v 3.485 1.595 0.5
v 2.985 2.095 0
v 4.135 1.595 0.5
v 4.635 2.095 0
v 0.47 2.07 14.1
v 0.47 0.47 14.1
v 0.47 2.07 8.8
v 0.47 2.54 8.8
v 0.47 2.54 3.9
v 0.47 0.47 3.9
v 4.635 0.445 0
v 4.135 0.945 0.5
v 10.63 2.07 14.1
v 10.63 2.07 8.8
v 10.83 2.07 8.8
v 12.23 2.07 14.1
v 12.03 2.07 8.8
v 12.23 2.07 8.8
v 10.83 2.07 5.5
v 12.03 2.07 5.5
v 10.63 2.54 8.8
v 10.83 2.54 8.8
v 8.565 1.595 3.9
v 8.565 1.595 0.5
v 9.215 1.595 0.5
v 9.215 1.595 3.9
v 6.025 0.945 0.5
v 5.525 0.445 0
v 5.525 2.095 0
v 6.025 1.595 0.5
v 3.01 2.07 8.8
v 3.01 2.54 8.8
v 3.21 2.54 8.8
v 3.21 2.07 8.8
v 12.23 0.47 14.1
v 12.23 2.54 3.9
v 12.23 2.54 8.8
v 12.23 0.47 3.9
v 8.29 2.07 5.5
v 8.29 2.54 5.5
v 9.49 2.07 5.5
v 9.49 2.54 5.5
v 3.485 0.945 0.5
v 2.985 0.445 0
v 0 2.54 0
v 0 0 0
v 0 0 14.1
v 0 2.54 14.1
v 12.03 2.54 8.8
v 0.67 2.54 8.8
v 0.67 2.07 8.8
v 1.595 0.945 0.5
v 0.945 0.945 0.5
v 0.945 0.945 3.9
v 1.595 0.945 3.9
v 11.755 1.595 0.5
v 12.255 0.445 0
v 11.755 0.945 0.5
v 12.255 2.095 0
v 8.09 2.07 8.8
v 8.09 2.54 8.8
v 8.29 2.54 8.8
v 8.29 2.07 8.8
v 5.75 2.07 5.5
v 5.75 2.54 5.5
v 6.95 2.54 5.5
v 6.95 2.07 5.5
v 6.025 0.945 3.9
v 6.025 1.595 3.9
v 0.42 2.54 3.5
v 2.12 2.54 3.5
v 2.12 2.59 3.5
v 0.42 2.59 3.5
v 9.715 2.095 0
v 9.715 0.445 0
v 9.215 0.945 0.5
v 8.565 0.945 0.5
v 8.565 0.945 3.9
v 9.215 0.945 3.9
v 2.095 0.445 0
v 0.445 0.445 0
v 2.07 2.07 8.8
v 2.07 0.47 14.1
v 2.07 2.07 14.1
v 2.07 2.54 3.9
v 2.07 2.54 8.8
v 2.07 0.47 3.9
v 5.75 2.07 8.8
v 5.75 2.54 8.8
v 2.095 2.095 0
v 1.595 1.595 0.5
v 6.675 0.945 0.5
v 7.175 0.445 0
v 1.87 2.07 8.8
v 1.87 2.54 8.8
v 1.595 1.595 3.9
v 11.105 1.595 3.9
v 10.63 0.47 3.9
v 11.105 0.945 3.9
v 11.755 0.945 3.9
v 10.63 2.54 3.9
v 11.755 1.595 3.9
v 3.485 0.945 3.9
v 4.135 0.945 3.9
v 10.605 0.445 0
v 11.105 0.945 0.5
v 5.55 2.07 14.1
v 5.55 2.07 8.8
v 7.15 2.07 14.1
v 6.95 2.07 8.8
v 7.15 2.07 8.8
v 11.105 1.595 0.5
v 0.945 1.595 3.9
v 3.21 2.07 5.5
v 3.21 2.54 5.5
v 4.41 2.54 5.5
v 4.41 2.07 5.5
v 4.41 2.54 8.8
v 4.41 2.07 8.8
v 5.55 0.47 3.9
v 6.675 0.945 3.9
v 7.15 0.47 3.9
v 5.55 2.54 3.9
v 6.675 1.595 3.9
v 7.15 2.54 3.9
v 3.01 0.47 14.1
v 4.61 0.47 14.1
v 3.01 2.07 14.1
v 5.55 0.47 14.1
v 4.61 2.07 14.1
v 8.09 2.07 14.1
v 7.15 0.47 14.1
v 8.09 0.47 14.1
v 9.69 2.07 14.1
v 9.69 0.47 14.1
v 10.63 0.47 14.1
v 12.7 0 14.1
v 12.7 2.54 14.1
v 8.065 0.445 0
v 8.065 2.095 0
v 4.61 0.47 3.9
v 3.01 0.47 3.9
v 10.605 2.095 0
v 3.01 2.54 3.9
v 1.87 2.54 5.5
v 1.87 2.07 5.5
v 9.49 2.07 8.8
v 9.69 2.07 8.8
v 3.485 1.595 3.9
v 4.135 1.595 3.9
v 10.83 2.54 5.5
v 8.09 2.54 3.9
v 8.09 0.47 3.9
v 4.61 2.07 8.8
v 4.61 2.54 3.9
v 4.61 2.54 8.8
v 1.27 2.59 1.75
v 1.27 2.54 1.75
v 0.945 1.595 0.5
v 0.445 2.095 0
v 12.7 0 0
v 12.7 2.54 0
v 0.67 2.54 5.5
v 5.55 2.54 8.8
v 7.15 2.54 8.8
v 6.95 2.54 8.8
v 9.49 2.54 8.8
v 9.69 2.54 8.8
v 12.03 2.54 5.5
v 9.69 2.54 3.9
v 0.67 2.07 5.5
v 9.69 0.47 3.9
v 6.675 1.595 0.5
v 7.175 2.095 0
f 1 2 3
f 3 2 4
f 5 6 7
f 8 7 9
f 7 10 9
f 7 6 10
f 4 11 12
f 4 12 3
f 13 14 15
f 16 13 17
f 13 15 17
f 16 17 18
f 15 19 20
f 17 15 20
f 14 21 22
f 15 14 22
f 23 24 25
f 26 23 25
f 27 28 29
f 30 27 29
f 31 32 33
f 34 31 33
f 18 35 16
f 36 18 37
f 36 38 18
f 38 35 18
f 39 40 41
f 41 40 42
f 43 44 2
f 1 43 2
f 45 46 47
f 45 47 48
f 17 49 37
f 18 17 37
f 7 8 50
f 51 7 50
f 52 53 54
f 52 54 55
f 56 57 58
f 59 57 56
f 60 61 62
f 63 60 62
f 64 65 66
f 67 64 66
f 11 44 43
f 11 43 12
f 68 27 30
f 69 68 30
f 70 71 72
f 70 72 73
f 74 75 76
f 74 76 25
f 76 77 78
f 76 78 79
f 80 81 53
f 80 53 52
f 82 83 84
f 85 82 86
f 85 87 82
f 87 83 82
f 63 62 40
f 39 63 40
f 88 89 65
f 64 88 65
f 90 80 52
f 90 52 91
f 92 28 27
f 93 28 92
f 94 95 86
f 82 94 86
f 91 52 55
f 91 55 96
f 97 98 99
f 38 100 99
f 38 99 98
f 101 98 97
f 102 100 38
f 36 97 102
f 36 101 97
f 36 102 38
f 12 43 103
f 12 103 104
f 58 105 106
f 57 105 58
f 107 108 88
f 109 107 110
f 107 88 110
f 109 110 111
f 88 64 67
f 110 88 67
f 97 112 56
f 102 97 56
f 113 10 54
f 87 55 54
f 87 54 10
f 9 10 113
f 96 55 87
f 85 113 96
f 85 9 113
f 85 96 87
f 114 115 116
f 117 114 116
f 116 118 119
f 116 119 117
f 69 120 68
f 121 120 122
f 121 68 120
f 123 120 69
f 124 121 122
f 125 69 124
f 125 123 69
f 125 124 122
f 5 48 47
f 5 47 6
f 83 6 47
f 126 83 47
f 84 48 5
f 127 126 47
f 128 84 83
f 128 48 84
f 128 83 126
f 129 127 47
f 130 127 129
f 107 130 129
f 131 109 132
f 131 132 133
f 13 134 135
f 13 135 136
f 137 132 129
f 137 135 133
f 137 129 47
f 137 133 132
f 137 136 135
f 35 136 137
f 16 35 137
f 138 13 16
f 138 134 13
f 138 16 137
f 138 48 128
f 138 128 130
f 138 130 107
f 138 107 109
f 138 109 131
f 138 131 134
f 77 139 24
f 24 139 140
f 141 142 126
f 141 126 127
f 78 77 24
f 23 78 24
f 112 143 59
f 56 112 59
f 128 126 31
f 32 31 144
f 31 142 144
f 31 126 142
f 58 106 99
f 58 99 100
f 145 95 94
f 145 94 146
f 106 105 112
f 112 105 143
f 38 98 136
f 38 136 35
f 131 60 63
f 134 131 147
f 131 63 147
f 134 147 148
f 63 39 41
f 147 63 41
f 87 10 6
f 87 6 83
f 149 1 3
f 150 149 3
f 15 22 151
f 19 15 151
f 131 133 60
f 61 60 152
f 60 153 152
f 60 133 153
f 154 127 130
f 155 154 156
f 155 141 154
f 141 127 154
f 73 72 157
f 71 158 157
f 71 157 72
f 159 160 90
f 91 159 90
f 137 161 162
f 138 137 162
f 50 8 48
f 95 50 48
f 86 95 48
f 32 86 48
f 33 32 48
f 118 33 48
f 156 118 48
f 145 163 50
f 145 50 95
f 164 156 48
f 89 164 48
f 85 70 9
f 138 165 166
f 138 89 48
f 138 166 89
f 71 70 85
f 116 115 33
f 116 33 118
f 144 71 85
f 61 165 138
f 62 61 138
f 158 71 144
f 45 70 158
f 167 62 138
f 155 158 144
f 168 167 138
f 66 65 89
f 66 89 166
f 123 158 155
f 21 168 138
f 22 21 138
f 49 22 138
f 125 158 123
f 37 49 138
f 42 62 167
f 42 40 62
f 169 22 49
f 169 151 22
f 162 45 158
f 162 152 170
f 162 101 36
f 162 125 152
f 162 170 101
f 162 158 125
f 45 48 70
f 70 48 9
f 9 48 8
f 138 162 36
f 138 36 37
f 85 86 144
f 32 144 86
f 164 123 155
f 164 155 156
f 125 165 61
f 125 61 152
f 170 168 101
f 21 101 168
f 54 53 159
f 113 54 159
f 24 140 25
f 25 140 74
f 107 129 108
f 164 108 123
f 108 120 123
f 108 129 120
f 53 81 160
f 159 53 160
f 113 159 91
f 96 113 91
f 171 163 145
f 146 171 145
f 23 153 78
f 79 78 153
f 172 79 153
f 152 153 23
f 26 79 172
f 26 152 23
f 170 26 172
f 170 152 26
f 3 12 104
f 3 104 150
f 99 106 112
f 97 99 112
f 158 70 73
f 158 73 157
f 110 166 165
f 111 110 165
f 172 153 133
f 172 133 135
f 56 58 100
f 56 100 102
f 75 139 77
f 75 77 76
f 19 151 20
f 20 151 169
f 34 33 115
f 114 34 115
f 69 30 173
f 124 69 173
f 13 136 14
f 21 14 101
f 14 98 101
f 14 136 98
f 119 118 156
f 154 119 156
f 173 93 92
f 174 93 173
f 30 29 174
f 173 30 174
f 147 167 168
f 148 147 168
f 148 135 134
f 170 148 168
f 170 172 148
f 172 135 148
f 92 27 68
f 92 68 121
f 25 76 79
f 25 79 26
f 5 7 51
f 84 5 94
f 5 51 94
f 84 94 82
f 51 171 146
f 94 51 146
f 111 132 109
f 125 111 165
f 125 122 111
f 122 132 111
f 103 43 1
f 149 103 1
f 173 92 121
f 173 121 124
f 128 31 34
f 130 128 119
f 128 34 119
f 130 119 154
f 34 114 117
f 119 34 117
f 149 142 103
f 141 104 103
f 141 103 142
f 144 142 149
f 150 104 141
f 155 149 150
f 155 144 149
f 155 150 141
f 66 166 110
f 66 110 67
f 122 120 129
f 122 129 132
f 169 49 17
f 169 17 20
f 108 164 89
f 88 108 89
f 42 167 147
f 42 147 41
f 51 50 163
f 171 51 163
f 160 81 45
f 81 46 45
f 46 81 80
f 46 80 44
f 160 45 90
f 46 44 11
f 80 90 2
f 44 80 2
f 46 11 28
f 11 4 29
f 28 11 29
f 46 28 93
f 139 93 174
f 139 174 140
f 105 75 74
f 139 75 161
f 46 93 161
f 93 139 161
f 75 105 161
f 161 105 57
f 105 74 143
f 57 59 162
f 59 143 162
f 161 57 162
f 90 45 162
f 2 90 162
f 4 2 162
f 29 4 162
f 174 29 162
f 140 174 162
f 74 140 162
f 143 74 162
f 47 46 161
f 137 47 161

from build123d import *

# Parameters (mm, degrees)
SKETCH1_W                  = 2.54
SKETCH1_H                  = 2.54
SKETCH1_W_2                = 0.65
SKETCH1_H_2                = 0.65
BOSS_EXTRUDE1_DEPTH        = 14.1
CHAMFER1_SIZE              = 0.5
SKETCH4_W                  = 1.6
SKETCH4_H                  = 1.6
CUT_EXTRUDE2_DEPTH         = 1.5
CUT_EXTRUDE1_START         = -10.2
SKETCH2_W                  = 1.6
SKETCH2_H                  = 1.6
CUT_EXTRUDE1_DEPTH         = 10.2
BOSS_EXTRUDE2_DEPTH        = 0.05
SKETCH5_W                  = 0.2
SKETCH5_H                  = 3.3
CUT_EXTRUDE3_DEPTH         = 0.47
LPATTERN1_COUNT            = 5
LPATTERN1_PITCH            = 2.54
CHAMFER1_OF_LPATTERN1_SIZE = 0.5


with BuildPart() as part:
    # Sketch1 → Boss-Extrude1 (new body)
    with BuildSketch(Plane.XY):
        with Locations((1.27, 1.27)):
            Rectangle(SKETCH1_W, SKETCH1_H)
        with Locations((1.27, 1.27)):
            Rectangle(SKETCH1_W_2, SKETCH1_H_2, mode=Mode.SUBTRACT)
    boss_extrude1 = extrude(amount=BOSS_EXTRUDE1_DEPTH)

    # Chamfer1
    chamfer1_edges = [part.edges().sort_by_distance(p)[0] for p in [
        (1.595, 1.27, 0),
        (1.27, 1.595, 0),
        (0.945, 1.27, 0),
        (1.27, 0.945, 0),
    ]]
    chamfer(chamfer1_edges, length=CHAMFER1_SIZE)

    # Sketch4 → Cut-Extrude2 (cut)
    with BuildSketch(Plane(origin=(0, 2.54, 0), x_dir=(1, 0, 0), z_dir=(0, 1, 0))):
        with Locations((1.27, -4.7)):
            Rectangle(SKETCH4_W, SKETCH4_H)
    cut_extrude2 = extrude(amount=-CUT_EXTRUDE2_DEPTH, mode=Mode.SUBTRACT)

    # Sketch2 → Cut-Extrude1 (cut)
    with BuildSketch(Plane.XY.offset(14.1).offset(CUT_EXTRUDE1_START)):
        with Locations((1.27, 1.27)):
            Rectangle(SKETCH2_W, SKETCH2_H)
    cut_extrude1 = extrude(amount=CUT_EXTRUDE1_DEPTH, mode=Mode.SUBTRACT)

    # Sketch3 → Boss-Extrude2 (add)
    with BuildSketch(Plane(origin=(0, 2.54, 0), x_dir=(1, 0, 0), z_dir=(0, 1, 0))):
        Polygon((2.12, -3.5), (0.42, -3.5), (1.27, -1.75), align=None)
    extrude(amount=BOSS_EXTRUDE2_DEPTH)

    # Sketch5 → Cut-Extrude3 (cut)
    with BuildSketch(Plane(origin=(0, 2.54, 0), x_dir=(1, 0, 0), z_dir=(0, 1, 0))):
        with Locations((0.57, -7.15)):
            Rectangle(SKETCH5_W, SKETCH5_H)
        with Locations((1.97, -7.15)):
            Rectangle(SKETCH5_W, SKETCH5_H)
    cut_extrude3 = extrude(amount=-CUT_EXTRUDE3_DEPTH, mode=Mode.SUBTRACT)

    # LPattern1: Boss-Extrude1, Cut-Extrude2, Cut-Extrude1, Cut-Extrude3 ×5
    with Locations(*[(i * LPATTERN1_PITCH, 0, 0) for i in range(1, LPATTERN1_COUNT)]):
        add(boss_extrude1)
        add(cut_extrude2, mode=Mode.SUBTRACT)
        add(cut_extrude1, mode=Mode.SUBTRACT)
        add(cut_extrude3, mode=Mode.SUBTRACT)

    # Chamfer1 of LPattern1
    chamfer1_of_lpattern1_edges = [part.edges().sort_by_distance(p)[0] for p in [
        (4.135, 1.27, 0),
        (3.81, 1.595, 0),
        (3.485, 1.27, 0),
        (3.81, 0.945, 0),
        (6.675, 1.27, 0),
        (6.35, 1.595, 0),
        (6.025, 1.27, 0),
        (6.35, 0.945, 0),
        (9.215, 1.27, 0),
        (8.89, 1.595, 0),
        (8.565, 1.27, 0),
        (8.89, 0.945, 0),
        (11.755, 1.27, 0),
        (11.43, 1.595, 0),
        (11.105, 1.27, 0),
        (11.43, 0.945, 0),
    ]]
    chamfer(chamfer1_of_lpattern1_edges, length=CHAMFER1_OF_LPATTERN1_SIZE)


solid = part.part
